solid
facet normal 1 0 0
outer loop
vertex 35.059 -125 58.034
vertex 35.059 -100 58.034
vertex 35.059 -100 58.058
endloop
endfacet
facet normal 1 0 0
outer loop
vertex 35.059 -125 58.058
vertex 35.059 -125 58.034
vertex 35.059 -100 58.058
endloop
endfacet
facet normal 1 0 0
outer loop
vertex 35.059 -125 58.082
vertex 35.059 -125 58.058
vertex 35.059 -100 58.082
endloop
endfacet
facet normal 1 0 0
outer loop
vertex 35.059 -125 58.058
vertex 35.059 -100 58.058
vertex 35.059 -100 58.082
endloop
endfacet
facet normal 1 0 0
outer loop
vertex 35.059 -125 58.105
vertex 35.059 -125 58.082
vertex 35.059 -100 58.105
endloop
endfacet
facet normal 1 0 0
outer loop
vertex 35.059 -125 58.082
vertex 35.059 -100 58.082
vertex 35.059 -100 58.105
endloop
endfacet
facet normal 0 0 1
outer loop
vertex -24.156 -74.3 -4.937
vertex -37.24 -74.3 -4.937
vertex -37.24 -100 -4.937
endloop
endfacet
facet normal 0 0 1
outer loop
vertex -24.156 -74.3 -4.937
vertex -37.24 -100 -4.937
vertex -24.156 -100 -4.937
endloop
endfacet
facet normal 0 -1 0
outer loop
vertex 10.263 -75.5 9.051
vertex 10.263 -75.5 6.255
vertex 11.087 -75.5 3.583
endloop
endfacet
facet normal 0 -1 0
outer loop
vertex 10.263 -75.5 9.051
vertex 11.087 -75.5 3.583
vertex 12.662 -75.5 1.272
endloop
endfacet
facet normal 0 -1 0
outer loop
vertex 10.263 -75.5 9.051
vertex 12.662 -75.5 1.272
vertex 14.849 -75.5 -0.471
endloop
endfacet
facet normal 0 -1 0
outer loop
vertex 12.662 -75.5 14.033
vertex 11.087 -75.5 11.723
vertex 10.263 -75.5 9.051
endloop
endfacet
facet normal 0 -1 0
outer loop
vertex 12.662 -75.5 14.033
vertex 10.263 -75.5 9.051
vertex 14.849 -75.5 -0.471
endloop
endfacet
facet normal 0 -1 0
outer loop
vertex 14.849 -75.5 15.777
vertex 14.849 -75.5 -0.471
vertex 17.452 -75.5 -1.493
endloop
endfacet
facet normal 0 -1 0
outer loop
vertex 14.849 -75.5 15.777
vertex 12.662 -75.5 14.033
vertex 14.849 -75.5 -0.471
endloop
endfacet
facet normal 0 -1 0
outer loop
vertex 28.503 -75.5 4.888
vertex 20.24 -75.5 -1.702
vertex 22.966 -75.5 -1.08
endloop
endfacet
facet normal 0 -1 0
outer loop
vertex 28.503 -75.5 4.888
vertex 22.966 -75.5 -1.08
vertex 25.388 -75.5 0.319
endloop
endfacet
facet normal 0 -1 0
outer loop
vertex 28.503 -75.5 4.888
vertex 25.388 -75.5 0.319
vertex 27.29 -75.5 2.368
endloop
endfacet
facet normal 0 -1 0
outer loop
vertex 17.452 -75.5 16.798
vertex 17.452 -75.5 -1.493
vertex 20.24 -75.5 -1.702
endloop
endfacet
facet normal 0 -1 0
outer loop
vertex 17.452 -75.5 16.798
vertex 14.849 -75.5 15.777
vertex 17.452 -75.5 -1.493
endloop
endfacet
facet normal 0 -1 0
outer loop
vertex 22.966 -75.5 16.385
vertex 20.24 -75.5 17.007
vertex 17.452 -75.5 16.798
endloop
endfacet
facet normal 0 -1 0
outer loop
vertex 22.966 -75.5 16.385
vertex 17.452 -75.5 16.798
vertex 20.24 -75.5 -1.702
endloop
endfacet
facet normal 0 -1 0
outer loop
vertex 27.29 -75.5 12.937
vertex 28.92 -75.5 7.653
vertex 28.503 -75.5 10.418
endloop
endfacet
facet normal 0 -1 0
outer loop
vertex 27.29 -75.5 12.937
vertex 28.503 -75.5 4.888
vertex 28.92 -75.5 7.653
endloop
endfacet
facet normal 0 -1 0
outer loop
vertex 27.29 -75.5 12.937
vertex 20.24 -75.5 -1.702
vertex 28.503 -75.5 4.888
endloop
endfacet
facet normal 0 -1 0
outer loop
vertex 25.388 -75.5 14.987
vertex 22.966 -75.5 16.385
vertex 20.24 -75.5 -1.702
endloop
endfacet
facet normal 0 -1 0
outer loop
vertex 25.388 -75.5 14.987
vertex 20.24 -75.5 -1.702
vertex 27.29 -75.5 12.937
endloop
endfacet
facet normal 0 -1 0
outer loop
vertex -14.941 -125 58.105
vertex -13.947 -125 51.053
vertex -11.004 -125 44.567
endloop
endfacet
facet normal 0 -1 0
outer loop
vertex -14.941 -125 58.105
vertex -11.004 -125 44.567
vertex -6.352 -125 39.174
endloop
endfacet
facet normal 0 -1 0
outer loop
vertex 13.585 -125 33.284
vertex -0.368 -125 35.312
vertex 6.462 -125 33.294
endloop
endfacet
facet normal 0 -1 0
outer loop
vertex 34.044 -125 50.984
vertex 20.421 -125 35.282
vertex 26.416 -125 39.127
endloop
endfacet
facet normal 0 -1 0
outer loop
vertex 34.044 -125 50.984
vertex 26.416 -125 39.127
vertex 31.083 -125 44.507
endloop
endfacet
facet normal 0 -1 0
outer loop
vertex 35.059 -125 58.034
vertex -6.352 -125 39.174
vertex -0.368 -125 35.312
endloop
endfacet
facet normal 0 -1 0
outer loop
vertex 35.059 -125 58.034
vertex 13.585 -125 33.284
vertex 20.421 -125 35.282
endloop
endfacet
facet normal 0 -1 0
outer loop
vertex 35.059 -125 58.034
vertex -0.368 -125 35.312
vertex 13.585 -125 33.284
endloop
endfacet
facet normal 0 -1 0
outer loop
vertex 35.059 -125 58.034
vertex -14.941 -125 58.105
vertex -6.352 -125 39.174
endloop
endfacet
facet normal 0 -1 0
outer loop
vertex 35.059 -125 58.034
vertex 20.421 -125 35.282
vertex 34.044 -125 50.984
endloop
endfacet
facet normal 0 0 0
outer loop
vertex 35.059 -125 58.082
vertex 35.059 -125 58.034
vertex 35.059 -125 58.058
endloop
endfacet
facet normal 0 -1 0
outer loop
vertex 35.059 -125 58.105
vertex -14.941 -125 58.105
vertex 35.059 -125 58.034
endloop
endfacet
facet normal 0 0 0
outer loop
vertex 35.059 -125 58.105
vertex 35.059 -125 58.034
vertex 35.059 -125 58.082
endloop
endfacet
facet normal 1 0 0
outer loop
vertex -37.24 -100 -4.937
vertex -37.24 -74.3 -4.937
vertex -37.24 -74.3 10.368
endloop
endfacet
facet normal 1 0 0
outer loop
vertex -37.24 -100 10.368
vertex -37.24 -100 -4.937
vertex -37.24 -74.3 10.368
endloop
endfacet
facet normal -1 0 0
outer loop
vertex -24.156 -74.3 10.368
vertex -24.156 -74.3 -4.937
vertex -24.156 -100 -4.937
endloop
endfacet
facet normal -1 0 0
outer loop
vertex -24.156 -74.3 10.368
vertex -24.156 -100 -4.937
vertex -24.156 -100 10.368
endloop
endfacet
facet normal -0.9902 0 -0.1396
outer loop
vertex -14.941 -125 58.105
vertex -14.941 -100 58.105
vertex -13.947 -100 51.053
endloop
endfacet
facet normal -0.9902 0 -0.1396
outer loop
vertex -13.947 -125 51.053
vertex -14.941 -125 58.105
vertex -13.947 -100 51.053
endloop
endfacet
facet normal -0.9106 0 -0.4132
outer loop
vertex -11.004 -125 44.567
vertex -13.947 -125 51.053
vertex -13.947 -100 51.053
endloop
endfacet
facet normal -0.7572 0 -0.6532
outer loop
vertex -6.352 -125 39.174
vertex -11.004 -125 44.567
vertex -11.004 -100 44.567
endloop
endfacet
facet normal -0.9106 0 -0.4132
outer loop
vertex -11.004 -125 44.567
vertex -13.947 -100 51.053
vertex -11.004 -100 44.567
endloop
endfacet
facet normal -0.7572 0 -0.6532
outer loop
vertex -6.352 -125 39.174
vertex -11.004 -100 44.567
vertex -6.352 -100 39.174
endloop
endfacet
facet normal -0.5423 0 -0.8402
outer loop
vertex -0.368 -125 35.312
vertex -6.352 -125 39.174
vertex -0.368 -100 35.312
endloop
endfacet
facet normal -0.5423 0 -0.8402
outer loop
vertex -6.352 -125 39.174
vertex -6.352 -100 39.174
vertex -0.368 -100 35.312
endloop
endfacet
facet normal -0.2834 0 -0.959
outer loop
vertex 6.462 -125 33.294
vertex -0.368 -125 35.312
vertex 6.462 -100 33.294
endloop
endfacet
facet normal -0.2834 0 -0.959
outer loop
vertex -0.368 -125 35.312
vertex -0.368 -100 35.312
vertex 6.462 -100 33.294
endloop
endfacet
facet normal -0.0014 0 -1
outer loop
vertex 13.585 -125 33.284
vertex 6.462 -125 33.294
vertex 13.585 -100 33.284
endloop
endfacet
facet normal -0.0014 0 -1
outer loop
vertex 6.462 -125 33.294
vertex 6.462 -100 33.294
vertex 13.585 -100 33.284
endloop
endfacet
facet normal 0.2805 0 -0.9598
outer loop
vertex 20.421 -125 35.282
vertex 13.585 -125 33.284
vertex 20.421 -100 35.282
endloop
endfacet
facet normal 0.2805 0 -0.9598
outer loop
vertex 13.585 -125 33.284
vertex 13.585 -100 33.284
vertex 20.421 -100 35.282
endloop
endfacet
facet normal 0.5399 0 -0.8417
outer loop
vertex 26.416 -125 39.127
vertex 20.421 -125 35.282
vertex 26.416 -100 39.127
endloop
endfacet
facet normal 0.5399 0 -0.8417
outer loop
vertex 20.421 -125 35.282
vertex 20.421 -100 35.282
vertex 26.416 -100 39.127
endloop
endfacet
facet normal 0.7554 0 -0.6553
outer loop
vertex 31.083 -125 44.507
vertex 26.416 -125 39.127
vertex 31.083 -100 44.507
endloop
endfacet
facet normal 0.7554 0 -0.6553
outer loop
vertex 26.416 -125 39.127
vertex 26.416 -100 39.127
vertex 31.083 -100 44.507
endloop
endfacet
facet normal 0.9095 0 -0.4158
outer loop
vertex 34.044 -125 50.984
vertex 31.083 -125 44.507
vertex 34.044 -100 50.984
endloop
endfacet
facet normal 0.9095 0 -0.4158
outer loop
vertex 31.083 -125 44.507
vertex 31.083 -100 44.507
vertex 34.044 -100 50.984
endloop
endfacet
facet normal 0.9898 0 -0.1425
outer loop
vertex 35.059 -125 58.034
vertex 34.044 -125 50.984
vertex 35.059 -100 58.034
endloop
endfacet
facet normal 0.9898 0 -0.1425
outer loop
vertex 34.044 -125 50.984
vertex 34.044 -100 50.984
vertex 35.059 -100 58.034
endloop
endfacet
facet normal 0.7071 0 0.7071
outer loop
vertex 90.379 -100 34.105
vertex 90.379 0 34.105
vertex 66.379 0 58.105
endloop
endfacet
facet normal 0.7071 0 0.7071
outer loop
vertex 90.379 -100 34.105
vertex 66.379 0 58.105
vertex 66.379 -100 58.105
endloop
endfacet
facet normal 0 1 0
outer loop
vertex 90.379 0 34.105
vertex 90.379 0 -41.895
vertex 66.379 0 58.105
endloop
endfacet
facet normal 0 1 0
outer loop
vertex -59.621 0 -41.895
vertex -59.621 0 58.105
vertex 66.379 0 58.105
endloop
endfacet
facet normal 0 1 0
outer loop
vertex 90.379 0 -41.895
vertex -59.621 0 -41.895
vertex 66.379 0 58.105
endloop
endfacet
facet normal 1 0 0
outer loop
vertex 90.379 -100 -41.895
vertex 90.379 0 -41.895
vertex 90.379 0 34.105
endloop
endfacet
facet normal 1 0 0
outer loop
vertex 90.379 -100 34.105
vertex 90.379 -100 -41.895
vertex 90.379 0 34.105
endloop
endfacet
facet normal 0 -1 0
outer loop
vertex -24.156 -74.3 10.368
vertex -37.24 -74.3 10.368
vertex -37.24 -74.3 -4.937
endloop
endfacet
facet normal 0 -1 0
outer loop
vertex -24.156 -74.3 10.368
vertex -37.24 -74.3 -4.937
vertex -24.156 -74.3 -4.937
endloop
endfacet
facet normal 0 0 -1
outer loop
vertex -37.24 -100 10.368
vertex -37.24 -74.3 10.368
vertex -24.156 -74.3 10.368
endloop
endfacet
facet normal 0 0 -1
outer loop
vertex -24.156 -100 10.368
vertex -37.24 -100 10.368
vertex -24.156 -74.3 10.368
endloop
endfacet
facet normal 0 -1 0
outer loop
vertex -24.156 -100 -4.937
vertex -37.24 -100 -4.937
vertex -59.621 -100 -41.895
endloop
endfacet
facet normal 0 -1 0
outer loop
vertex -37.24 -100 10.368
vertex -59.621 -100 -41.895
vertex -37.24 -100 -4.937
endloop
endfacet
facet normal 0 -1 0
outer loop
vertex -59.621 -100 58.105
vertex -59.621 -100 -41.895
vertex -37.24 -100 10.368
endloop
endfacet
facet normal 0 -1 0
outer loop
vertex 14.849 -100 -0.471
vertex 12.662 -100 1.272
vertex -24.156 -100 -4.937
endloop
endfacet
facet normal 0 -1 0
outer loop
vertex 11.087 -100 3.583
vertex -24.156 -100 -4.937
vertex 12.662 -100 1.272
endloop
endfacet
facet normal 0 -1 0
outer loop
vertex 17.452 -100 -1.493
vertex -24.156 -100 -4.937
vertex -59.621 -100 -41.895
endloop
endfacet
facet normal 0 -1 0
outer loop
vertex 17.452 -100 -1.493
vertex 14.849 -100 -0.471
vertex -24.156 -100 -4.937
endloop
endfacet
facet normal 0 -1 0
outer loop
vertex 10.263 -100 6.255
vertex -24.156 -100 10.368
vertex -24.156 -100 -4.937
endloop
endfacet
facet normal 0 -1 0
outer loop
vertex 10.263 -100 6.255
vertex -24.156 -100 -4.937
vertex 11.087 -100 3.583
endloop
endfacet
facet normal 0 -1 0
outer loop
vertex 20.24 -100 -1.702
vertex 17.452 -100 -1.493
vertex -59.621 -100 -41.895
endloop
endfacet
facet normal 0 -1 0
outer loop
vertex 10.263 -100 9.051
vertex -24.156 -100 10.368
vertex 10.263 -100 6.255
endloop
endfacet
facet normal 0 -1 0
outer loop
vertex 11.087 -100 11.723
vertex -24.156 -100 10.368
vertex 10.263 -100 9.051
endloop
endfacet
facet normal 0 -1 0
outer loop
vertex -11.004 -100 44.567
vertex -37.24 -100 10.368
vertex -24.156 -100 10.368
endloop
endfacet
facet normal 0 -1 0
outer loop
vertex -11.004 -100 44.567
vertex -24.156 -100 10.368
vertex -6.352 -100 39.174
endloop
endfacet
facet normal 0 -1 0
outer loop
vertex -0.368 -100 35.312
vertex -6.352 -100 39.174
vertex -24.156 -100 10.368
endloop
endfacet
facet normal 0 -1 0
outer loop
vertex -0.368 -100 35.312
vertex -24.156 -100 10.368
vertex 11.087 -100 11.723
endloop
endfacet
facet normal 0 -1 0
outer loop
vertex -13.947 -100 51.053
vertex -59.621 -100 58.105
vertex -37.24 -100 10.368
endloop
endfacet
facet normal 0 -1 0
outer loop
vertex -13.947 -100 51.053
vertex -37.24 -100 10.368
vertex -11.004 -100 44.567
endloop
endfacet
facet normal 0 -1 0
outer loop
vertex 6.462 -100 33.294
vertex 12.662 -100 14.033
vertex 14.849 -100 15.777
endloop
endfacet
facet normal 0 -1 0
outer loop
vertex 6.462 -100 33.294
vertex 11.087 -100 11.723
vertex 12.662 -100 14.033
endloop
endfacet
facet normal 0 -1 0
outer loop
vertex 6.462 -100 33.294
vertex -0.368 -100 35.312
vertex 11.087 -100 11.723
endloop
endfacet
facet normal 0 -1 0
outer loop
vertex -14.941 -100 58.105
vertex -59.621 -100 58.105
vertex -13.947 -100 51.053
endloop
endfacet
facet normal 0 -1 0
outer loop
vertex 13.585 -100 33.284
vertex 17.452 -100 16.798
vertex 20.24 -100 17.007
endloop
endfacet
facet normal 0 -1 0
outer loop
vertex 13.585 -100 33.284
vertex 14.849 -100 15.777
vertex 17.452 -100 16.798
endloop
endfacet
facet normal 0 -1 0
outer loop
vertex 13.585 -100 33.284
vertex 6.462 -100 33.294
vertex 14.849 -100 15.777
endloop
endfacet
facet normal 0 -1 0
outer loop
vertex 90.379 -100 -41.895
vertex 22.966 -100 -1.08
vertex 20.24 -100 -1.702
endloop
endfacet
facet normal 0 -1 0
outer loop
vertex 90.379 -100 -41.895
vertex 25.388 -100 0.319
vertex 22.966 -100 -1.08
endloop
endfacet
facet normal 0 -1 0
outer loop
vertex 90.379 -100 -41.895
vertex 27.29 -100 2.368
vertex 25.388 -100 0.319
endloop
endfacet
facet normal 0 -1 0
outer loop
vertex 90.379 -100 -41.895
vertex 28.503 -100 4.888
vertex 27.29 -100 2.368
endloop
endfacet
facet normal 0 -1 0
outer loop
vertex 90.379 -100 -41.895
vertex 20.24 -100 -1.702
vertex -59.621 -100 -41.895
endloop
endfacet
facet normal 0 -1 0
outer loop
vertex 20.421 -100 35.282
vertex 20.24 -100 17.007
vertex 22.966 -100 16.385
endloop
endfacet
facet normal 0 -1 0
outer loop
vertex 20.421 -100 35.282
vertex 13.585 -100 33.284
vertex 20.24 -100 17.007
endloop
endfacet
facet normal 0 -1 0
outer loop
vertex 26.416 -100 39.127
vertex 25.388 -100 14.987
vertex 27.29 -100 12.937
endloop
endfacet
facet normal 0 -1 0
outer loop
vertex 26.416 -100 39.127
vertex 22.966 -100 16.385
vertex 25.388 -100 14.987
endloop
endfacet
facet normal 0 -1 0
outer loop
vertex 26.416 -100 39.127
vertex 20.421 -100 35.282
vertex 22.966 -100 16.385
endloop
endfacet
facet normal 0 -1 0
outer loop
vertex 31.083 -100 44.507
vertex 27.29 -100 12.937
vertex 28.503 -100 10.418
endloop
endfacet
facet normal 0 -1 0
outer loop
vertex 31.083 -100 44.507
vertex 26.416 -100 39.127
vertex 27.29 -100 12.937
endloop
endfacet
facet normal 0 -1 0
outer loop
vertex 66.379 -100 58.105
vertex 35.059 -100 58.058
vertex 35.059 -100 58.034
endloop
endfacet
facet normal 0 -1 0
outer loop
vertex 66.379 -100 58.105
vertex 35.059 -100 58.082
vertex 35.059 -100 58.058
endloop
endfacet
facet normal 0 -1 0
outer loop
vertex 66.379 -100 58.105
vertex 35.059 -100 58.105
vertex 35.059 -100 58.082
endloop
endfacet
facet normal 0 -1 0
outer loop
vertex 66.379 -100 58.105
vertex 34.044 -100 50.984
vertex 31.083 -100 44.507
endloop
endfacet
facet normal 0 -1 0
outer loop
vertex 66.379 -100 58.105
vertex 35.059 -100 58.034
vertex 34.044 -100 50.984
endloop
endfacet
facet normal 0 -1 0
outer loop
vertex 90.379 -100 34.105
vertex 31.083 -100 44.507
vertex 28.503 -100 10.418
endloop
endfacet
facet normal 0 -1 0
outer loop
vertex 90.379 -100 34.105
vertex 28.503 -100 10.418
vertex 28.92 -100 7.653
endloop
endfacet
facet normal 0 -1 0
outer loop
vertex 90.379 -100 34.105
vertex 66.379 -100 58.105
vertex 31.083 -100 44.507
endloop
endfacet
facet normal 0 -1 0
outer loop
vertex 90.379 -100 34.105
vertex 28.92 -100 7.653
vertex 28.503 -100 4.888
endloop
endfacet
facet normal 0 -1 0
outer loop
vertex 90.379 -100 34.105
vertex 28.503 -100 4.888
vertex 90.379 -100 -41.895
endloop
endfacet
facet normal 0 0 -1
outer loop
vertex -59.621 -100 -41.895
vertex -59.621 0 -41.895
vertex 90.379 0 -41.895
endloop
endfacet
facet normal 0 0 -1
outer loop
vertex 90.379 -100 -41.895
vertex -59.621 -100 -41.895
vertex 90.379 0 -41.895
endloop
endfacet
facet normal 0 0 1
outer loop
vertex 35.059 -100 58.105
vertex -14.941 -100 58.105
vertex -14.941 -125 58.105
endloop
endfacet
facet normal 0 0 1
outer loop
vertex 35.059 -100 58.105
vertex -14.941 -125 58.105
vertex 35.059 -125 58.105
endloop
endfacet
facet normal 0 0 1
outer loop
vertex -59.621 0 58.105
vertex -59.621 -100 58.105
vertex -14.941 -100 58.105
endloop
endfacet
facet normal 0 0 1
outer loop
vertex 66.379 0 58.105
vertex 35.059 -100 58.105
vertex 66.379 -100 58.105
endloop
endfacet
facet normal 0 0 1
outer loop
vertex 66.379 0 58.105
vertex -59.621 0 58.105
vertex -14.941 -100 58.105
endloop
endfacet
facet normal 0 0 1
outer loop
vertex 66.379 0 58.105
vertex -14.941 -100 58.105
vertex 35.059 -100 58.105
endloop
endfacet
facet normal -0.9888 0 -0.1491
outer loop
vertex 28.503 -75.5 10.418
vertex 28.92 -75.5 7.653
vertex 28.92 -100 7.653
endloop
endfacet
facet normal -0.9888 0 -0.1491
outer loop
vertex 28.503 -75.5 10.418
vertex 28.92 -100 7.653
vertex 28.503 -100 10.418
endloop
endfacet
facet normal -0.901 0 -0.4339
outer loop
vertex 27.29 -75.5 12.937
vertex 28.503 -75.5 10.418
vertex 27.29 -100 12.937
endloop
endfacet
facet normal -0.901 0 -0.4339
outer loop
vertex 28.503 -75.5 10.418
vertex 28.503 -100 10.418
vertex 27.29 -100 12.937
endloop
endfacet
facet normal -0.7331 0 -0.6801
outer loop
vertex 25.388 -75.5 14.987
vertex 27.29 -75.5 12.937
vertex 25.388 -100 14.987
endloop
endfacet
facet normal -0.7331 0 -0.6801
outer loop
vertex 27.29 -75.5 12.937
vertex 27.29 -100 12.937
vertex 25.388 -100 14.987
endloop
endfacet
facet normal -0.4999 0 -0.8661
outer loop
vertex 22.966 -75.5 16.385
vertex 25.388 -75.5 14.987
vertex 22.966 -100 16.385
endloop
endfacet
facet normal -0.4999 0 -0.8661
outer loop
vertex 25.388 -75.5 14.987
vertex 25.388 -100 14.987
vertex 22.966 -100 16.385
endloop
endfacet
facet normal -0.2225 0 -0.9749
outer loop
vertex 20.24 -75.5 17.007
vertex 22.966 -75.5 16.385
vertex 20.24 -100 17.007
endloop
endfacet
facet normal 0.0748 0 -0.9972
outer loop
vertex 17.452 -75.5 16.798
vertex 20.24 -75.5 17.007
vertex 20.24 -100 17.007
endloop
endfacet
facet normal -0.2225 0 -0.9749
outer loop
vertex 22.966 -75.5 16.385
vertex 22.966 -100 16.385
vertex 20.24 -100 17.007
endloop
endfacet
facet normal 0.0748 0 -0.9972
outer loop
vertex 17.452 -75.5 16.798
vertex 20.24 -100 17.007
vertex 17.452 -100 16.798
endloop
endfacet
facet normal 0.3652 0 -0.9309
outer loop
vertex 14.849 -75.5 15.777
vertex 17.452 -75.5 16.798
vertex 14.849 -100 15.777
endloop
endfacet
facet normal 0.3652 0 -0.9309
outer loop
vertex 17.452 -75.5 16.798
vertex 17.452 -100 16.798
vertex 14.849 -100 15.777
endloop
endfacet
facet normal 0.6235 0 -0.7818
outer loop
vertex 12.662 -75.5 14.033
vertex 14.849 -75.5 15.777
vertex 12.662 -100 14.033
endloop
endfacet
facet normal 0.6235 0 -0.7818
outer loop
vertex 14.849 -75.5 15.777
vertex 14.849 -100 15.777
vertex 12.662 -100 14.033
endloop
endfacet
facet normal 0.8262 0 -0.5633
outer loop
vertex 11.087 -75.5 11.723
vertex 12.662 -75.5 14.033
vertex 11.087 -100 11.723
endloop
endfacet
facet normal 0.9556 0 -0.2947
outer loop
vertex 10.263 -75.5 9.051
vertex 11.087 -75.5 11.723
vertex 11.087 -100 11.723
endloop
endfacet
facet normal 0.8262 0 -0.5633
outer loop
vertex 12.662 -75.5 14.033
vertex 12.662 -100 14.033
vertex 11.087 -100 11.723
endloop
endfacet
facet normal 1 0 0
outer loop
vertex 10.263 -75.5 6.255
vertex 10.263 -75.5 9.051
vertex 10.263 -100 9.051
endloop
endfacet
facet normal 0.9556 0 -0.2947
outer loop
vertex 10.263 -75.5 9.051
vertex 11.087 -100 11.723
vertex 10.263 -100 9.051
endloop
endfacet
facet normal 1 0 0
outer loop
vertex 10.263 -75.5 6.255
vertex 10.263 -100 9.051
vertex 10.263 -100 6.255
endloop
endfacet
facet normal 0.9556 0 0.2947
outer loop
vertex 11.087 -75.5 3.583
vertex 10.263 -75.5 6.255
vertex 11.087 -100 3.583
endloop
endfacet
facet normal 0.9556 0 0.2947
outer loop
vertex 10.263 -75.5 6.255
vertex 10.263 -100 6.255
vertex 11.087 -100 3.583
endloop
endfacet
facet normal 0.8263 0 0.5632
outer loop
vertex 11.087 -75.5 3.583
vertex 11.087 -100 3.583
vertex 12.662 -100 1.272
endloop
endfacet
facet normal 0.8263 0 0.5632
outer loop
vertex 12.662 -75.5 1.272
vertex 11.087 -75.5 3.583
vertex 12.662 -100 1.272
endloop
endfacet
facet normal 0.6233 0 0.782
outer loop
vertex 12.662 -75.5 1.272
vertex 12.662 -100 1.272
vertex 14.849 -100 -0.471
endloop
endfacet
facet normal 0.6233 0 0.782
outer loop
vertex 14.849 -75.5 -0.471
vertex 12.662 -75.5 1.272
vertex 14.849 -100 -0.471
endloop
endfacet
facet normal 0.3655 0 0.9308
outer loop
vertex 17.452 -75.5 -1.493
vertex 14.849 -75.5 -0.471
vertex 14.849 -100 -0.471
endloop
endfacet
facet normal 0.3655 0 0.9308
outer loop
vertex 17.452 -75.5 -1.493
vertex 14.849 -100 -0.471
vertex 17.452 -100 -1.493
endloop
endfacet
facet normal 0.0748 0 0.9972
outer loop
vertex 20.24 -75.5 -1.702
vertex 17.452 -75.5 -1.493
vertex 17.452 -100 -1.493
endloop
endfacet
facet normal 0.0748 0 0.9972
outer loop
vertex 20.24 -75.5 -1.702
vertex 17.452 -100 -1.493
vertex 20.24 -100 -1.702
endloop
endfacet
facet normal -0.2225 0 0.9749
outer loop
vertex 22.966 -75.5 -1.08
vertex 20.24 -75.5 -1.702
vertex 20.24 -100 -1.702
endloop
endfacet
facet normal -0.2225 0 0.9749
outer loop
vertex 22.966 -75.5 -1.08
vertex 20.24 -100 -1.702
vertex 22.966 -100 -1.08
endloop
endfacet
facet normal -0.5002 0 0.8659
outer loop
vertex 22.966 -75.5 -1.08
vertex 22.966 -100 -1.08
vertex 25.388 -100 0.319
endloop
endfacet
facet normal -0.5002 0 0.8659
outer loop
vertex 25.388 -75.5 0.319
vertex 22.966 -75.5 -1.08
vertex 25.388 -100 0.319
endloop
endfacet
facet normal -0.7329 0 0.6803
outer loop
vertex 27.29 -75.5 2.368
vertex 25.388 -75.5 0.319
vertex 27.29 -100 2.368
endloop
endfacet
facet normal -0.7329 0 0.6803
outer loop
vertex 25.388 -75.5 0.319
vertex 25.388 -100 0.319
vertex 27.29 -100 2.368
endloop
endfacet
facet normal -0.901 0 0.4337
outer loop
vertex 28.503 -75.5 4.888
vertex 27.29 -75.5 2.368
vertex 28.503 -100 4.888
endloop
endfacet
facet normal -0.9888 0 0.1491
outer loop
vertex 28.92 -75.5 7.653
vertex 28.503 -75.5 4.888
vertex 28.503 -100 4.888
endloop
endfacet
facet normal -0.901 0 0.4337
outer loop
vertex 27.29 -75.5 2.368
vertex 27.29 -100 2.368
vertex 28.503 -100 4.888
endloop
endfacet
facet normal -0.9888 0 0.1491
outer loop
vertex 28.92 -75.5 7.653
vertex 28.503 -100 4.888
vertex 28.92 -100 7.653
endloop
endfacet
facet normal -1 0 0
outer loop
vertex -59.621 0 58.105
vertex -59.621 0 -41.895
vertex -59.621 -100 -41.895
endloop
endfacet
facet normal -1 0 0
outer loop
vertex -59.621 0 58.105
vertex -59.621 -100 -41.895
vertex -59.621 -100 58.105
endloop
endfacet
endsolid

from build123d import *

# Parameters (mm, degrees)
F0_W     = 150
F0_H     = 100
F1_DEPTH = 100
F4_DEPTH = 25
F5_SIZE  = 24
F6_R     = 9.380877
F7_DEPTH = 24.5
F8_W     = 13.083855
F8_H     = 15.305644
F9_DEPTH = 25.7


with BuildPart() as f1:
    # F0 (on Front) → F1 (new body)
    with BuildSketch(Plane.XZ):
        with Locations((15.379184, 8.105334)):
            Rectangle(F0_W, F0_H)
    extrude(amount=F1_DEPTH)

    # F3 (on face) → F4 (join)
    with BuildSketch(Plane.XZ.offset(100)):
        with BuildLine():
            ThreePointArc((-14.94097, 58.105334), (10.023203, 33.033909), (35.058928, 58.033884))
            ThreePointArc((35.058928, 58.033884), (35.058903, 58.069609), (35.058826, 58.105334))
            Line((35.058826, 58.105334), (-14.94097, 58.105334))
        make_face()
    extrude(amount=F4_DEPTH)

    # F5
    f5_edges = [f1.edges().sort_by_distance(p)[0] for p in [
        (90.379184, -50, 58.105334),
    ]]
    chamfer(f5_edges, length=F5_SIZE)

    # F6 (on face) → F7 (cut)
    with BuildSketch(Plane.XZ.offset(100)):
        with Locations((19.53912, 7.652821)):
            Circle(F6_R)
    extrude(amount=-F7_DEPTH, mode=Mode.SUBTRACT)

    # F8 (on face) → F9 (cut)
    with BuildSketch(Plane.XZ.offset(100)):
        with Locations((-30.697948, 2.715517)):
            Rectangle(F8_W, F8_H)
    extrude(amount=-F9_DEPTH, mode=Mode.SUBTRACT)


solid = f1.part
